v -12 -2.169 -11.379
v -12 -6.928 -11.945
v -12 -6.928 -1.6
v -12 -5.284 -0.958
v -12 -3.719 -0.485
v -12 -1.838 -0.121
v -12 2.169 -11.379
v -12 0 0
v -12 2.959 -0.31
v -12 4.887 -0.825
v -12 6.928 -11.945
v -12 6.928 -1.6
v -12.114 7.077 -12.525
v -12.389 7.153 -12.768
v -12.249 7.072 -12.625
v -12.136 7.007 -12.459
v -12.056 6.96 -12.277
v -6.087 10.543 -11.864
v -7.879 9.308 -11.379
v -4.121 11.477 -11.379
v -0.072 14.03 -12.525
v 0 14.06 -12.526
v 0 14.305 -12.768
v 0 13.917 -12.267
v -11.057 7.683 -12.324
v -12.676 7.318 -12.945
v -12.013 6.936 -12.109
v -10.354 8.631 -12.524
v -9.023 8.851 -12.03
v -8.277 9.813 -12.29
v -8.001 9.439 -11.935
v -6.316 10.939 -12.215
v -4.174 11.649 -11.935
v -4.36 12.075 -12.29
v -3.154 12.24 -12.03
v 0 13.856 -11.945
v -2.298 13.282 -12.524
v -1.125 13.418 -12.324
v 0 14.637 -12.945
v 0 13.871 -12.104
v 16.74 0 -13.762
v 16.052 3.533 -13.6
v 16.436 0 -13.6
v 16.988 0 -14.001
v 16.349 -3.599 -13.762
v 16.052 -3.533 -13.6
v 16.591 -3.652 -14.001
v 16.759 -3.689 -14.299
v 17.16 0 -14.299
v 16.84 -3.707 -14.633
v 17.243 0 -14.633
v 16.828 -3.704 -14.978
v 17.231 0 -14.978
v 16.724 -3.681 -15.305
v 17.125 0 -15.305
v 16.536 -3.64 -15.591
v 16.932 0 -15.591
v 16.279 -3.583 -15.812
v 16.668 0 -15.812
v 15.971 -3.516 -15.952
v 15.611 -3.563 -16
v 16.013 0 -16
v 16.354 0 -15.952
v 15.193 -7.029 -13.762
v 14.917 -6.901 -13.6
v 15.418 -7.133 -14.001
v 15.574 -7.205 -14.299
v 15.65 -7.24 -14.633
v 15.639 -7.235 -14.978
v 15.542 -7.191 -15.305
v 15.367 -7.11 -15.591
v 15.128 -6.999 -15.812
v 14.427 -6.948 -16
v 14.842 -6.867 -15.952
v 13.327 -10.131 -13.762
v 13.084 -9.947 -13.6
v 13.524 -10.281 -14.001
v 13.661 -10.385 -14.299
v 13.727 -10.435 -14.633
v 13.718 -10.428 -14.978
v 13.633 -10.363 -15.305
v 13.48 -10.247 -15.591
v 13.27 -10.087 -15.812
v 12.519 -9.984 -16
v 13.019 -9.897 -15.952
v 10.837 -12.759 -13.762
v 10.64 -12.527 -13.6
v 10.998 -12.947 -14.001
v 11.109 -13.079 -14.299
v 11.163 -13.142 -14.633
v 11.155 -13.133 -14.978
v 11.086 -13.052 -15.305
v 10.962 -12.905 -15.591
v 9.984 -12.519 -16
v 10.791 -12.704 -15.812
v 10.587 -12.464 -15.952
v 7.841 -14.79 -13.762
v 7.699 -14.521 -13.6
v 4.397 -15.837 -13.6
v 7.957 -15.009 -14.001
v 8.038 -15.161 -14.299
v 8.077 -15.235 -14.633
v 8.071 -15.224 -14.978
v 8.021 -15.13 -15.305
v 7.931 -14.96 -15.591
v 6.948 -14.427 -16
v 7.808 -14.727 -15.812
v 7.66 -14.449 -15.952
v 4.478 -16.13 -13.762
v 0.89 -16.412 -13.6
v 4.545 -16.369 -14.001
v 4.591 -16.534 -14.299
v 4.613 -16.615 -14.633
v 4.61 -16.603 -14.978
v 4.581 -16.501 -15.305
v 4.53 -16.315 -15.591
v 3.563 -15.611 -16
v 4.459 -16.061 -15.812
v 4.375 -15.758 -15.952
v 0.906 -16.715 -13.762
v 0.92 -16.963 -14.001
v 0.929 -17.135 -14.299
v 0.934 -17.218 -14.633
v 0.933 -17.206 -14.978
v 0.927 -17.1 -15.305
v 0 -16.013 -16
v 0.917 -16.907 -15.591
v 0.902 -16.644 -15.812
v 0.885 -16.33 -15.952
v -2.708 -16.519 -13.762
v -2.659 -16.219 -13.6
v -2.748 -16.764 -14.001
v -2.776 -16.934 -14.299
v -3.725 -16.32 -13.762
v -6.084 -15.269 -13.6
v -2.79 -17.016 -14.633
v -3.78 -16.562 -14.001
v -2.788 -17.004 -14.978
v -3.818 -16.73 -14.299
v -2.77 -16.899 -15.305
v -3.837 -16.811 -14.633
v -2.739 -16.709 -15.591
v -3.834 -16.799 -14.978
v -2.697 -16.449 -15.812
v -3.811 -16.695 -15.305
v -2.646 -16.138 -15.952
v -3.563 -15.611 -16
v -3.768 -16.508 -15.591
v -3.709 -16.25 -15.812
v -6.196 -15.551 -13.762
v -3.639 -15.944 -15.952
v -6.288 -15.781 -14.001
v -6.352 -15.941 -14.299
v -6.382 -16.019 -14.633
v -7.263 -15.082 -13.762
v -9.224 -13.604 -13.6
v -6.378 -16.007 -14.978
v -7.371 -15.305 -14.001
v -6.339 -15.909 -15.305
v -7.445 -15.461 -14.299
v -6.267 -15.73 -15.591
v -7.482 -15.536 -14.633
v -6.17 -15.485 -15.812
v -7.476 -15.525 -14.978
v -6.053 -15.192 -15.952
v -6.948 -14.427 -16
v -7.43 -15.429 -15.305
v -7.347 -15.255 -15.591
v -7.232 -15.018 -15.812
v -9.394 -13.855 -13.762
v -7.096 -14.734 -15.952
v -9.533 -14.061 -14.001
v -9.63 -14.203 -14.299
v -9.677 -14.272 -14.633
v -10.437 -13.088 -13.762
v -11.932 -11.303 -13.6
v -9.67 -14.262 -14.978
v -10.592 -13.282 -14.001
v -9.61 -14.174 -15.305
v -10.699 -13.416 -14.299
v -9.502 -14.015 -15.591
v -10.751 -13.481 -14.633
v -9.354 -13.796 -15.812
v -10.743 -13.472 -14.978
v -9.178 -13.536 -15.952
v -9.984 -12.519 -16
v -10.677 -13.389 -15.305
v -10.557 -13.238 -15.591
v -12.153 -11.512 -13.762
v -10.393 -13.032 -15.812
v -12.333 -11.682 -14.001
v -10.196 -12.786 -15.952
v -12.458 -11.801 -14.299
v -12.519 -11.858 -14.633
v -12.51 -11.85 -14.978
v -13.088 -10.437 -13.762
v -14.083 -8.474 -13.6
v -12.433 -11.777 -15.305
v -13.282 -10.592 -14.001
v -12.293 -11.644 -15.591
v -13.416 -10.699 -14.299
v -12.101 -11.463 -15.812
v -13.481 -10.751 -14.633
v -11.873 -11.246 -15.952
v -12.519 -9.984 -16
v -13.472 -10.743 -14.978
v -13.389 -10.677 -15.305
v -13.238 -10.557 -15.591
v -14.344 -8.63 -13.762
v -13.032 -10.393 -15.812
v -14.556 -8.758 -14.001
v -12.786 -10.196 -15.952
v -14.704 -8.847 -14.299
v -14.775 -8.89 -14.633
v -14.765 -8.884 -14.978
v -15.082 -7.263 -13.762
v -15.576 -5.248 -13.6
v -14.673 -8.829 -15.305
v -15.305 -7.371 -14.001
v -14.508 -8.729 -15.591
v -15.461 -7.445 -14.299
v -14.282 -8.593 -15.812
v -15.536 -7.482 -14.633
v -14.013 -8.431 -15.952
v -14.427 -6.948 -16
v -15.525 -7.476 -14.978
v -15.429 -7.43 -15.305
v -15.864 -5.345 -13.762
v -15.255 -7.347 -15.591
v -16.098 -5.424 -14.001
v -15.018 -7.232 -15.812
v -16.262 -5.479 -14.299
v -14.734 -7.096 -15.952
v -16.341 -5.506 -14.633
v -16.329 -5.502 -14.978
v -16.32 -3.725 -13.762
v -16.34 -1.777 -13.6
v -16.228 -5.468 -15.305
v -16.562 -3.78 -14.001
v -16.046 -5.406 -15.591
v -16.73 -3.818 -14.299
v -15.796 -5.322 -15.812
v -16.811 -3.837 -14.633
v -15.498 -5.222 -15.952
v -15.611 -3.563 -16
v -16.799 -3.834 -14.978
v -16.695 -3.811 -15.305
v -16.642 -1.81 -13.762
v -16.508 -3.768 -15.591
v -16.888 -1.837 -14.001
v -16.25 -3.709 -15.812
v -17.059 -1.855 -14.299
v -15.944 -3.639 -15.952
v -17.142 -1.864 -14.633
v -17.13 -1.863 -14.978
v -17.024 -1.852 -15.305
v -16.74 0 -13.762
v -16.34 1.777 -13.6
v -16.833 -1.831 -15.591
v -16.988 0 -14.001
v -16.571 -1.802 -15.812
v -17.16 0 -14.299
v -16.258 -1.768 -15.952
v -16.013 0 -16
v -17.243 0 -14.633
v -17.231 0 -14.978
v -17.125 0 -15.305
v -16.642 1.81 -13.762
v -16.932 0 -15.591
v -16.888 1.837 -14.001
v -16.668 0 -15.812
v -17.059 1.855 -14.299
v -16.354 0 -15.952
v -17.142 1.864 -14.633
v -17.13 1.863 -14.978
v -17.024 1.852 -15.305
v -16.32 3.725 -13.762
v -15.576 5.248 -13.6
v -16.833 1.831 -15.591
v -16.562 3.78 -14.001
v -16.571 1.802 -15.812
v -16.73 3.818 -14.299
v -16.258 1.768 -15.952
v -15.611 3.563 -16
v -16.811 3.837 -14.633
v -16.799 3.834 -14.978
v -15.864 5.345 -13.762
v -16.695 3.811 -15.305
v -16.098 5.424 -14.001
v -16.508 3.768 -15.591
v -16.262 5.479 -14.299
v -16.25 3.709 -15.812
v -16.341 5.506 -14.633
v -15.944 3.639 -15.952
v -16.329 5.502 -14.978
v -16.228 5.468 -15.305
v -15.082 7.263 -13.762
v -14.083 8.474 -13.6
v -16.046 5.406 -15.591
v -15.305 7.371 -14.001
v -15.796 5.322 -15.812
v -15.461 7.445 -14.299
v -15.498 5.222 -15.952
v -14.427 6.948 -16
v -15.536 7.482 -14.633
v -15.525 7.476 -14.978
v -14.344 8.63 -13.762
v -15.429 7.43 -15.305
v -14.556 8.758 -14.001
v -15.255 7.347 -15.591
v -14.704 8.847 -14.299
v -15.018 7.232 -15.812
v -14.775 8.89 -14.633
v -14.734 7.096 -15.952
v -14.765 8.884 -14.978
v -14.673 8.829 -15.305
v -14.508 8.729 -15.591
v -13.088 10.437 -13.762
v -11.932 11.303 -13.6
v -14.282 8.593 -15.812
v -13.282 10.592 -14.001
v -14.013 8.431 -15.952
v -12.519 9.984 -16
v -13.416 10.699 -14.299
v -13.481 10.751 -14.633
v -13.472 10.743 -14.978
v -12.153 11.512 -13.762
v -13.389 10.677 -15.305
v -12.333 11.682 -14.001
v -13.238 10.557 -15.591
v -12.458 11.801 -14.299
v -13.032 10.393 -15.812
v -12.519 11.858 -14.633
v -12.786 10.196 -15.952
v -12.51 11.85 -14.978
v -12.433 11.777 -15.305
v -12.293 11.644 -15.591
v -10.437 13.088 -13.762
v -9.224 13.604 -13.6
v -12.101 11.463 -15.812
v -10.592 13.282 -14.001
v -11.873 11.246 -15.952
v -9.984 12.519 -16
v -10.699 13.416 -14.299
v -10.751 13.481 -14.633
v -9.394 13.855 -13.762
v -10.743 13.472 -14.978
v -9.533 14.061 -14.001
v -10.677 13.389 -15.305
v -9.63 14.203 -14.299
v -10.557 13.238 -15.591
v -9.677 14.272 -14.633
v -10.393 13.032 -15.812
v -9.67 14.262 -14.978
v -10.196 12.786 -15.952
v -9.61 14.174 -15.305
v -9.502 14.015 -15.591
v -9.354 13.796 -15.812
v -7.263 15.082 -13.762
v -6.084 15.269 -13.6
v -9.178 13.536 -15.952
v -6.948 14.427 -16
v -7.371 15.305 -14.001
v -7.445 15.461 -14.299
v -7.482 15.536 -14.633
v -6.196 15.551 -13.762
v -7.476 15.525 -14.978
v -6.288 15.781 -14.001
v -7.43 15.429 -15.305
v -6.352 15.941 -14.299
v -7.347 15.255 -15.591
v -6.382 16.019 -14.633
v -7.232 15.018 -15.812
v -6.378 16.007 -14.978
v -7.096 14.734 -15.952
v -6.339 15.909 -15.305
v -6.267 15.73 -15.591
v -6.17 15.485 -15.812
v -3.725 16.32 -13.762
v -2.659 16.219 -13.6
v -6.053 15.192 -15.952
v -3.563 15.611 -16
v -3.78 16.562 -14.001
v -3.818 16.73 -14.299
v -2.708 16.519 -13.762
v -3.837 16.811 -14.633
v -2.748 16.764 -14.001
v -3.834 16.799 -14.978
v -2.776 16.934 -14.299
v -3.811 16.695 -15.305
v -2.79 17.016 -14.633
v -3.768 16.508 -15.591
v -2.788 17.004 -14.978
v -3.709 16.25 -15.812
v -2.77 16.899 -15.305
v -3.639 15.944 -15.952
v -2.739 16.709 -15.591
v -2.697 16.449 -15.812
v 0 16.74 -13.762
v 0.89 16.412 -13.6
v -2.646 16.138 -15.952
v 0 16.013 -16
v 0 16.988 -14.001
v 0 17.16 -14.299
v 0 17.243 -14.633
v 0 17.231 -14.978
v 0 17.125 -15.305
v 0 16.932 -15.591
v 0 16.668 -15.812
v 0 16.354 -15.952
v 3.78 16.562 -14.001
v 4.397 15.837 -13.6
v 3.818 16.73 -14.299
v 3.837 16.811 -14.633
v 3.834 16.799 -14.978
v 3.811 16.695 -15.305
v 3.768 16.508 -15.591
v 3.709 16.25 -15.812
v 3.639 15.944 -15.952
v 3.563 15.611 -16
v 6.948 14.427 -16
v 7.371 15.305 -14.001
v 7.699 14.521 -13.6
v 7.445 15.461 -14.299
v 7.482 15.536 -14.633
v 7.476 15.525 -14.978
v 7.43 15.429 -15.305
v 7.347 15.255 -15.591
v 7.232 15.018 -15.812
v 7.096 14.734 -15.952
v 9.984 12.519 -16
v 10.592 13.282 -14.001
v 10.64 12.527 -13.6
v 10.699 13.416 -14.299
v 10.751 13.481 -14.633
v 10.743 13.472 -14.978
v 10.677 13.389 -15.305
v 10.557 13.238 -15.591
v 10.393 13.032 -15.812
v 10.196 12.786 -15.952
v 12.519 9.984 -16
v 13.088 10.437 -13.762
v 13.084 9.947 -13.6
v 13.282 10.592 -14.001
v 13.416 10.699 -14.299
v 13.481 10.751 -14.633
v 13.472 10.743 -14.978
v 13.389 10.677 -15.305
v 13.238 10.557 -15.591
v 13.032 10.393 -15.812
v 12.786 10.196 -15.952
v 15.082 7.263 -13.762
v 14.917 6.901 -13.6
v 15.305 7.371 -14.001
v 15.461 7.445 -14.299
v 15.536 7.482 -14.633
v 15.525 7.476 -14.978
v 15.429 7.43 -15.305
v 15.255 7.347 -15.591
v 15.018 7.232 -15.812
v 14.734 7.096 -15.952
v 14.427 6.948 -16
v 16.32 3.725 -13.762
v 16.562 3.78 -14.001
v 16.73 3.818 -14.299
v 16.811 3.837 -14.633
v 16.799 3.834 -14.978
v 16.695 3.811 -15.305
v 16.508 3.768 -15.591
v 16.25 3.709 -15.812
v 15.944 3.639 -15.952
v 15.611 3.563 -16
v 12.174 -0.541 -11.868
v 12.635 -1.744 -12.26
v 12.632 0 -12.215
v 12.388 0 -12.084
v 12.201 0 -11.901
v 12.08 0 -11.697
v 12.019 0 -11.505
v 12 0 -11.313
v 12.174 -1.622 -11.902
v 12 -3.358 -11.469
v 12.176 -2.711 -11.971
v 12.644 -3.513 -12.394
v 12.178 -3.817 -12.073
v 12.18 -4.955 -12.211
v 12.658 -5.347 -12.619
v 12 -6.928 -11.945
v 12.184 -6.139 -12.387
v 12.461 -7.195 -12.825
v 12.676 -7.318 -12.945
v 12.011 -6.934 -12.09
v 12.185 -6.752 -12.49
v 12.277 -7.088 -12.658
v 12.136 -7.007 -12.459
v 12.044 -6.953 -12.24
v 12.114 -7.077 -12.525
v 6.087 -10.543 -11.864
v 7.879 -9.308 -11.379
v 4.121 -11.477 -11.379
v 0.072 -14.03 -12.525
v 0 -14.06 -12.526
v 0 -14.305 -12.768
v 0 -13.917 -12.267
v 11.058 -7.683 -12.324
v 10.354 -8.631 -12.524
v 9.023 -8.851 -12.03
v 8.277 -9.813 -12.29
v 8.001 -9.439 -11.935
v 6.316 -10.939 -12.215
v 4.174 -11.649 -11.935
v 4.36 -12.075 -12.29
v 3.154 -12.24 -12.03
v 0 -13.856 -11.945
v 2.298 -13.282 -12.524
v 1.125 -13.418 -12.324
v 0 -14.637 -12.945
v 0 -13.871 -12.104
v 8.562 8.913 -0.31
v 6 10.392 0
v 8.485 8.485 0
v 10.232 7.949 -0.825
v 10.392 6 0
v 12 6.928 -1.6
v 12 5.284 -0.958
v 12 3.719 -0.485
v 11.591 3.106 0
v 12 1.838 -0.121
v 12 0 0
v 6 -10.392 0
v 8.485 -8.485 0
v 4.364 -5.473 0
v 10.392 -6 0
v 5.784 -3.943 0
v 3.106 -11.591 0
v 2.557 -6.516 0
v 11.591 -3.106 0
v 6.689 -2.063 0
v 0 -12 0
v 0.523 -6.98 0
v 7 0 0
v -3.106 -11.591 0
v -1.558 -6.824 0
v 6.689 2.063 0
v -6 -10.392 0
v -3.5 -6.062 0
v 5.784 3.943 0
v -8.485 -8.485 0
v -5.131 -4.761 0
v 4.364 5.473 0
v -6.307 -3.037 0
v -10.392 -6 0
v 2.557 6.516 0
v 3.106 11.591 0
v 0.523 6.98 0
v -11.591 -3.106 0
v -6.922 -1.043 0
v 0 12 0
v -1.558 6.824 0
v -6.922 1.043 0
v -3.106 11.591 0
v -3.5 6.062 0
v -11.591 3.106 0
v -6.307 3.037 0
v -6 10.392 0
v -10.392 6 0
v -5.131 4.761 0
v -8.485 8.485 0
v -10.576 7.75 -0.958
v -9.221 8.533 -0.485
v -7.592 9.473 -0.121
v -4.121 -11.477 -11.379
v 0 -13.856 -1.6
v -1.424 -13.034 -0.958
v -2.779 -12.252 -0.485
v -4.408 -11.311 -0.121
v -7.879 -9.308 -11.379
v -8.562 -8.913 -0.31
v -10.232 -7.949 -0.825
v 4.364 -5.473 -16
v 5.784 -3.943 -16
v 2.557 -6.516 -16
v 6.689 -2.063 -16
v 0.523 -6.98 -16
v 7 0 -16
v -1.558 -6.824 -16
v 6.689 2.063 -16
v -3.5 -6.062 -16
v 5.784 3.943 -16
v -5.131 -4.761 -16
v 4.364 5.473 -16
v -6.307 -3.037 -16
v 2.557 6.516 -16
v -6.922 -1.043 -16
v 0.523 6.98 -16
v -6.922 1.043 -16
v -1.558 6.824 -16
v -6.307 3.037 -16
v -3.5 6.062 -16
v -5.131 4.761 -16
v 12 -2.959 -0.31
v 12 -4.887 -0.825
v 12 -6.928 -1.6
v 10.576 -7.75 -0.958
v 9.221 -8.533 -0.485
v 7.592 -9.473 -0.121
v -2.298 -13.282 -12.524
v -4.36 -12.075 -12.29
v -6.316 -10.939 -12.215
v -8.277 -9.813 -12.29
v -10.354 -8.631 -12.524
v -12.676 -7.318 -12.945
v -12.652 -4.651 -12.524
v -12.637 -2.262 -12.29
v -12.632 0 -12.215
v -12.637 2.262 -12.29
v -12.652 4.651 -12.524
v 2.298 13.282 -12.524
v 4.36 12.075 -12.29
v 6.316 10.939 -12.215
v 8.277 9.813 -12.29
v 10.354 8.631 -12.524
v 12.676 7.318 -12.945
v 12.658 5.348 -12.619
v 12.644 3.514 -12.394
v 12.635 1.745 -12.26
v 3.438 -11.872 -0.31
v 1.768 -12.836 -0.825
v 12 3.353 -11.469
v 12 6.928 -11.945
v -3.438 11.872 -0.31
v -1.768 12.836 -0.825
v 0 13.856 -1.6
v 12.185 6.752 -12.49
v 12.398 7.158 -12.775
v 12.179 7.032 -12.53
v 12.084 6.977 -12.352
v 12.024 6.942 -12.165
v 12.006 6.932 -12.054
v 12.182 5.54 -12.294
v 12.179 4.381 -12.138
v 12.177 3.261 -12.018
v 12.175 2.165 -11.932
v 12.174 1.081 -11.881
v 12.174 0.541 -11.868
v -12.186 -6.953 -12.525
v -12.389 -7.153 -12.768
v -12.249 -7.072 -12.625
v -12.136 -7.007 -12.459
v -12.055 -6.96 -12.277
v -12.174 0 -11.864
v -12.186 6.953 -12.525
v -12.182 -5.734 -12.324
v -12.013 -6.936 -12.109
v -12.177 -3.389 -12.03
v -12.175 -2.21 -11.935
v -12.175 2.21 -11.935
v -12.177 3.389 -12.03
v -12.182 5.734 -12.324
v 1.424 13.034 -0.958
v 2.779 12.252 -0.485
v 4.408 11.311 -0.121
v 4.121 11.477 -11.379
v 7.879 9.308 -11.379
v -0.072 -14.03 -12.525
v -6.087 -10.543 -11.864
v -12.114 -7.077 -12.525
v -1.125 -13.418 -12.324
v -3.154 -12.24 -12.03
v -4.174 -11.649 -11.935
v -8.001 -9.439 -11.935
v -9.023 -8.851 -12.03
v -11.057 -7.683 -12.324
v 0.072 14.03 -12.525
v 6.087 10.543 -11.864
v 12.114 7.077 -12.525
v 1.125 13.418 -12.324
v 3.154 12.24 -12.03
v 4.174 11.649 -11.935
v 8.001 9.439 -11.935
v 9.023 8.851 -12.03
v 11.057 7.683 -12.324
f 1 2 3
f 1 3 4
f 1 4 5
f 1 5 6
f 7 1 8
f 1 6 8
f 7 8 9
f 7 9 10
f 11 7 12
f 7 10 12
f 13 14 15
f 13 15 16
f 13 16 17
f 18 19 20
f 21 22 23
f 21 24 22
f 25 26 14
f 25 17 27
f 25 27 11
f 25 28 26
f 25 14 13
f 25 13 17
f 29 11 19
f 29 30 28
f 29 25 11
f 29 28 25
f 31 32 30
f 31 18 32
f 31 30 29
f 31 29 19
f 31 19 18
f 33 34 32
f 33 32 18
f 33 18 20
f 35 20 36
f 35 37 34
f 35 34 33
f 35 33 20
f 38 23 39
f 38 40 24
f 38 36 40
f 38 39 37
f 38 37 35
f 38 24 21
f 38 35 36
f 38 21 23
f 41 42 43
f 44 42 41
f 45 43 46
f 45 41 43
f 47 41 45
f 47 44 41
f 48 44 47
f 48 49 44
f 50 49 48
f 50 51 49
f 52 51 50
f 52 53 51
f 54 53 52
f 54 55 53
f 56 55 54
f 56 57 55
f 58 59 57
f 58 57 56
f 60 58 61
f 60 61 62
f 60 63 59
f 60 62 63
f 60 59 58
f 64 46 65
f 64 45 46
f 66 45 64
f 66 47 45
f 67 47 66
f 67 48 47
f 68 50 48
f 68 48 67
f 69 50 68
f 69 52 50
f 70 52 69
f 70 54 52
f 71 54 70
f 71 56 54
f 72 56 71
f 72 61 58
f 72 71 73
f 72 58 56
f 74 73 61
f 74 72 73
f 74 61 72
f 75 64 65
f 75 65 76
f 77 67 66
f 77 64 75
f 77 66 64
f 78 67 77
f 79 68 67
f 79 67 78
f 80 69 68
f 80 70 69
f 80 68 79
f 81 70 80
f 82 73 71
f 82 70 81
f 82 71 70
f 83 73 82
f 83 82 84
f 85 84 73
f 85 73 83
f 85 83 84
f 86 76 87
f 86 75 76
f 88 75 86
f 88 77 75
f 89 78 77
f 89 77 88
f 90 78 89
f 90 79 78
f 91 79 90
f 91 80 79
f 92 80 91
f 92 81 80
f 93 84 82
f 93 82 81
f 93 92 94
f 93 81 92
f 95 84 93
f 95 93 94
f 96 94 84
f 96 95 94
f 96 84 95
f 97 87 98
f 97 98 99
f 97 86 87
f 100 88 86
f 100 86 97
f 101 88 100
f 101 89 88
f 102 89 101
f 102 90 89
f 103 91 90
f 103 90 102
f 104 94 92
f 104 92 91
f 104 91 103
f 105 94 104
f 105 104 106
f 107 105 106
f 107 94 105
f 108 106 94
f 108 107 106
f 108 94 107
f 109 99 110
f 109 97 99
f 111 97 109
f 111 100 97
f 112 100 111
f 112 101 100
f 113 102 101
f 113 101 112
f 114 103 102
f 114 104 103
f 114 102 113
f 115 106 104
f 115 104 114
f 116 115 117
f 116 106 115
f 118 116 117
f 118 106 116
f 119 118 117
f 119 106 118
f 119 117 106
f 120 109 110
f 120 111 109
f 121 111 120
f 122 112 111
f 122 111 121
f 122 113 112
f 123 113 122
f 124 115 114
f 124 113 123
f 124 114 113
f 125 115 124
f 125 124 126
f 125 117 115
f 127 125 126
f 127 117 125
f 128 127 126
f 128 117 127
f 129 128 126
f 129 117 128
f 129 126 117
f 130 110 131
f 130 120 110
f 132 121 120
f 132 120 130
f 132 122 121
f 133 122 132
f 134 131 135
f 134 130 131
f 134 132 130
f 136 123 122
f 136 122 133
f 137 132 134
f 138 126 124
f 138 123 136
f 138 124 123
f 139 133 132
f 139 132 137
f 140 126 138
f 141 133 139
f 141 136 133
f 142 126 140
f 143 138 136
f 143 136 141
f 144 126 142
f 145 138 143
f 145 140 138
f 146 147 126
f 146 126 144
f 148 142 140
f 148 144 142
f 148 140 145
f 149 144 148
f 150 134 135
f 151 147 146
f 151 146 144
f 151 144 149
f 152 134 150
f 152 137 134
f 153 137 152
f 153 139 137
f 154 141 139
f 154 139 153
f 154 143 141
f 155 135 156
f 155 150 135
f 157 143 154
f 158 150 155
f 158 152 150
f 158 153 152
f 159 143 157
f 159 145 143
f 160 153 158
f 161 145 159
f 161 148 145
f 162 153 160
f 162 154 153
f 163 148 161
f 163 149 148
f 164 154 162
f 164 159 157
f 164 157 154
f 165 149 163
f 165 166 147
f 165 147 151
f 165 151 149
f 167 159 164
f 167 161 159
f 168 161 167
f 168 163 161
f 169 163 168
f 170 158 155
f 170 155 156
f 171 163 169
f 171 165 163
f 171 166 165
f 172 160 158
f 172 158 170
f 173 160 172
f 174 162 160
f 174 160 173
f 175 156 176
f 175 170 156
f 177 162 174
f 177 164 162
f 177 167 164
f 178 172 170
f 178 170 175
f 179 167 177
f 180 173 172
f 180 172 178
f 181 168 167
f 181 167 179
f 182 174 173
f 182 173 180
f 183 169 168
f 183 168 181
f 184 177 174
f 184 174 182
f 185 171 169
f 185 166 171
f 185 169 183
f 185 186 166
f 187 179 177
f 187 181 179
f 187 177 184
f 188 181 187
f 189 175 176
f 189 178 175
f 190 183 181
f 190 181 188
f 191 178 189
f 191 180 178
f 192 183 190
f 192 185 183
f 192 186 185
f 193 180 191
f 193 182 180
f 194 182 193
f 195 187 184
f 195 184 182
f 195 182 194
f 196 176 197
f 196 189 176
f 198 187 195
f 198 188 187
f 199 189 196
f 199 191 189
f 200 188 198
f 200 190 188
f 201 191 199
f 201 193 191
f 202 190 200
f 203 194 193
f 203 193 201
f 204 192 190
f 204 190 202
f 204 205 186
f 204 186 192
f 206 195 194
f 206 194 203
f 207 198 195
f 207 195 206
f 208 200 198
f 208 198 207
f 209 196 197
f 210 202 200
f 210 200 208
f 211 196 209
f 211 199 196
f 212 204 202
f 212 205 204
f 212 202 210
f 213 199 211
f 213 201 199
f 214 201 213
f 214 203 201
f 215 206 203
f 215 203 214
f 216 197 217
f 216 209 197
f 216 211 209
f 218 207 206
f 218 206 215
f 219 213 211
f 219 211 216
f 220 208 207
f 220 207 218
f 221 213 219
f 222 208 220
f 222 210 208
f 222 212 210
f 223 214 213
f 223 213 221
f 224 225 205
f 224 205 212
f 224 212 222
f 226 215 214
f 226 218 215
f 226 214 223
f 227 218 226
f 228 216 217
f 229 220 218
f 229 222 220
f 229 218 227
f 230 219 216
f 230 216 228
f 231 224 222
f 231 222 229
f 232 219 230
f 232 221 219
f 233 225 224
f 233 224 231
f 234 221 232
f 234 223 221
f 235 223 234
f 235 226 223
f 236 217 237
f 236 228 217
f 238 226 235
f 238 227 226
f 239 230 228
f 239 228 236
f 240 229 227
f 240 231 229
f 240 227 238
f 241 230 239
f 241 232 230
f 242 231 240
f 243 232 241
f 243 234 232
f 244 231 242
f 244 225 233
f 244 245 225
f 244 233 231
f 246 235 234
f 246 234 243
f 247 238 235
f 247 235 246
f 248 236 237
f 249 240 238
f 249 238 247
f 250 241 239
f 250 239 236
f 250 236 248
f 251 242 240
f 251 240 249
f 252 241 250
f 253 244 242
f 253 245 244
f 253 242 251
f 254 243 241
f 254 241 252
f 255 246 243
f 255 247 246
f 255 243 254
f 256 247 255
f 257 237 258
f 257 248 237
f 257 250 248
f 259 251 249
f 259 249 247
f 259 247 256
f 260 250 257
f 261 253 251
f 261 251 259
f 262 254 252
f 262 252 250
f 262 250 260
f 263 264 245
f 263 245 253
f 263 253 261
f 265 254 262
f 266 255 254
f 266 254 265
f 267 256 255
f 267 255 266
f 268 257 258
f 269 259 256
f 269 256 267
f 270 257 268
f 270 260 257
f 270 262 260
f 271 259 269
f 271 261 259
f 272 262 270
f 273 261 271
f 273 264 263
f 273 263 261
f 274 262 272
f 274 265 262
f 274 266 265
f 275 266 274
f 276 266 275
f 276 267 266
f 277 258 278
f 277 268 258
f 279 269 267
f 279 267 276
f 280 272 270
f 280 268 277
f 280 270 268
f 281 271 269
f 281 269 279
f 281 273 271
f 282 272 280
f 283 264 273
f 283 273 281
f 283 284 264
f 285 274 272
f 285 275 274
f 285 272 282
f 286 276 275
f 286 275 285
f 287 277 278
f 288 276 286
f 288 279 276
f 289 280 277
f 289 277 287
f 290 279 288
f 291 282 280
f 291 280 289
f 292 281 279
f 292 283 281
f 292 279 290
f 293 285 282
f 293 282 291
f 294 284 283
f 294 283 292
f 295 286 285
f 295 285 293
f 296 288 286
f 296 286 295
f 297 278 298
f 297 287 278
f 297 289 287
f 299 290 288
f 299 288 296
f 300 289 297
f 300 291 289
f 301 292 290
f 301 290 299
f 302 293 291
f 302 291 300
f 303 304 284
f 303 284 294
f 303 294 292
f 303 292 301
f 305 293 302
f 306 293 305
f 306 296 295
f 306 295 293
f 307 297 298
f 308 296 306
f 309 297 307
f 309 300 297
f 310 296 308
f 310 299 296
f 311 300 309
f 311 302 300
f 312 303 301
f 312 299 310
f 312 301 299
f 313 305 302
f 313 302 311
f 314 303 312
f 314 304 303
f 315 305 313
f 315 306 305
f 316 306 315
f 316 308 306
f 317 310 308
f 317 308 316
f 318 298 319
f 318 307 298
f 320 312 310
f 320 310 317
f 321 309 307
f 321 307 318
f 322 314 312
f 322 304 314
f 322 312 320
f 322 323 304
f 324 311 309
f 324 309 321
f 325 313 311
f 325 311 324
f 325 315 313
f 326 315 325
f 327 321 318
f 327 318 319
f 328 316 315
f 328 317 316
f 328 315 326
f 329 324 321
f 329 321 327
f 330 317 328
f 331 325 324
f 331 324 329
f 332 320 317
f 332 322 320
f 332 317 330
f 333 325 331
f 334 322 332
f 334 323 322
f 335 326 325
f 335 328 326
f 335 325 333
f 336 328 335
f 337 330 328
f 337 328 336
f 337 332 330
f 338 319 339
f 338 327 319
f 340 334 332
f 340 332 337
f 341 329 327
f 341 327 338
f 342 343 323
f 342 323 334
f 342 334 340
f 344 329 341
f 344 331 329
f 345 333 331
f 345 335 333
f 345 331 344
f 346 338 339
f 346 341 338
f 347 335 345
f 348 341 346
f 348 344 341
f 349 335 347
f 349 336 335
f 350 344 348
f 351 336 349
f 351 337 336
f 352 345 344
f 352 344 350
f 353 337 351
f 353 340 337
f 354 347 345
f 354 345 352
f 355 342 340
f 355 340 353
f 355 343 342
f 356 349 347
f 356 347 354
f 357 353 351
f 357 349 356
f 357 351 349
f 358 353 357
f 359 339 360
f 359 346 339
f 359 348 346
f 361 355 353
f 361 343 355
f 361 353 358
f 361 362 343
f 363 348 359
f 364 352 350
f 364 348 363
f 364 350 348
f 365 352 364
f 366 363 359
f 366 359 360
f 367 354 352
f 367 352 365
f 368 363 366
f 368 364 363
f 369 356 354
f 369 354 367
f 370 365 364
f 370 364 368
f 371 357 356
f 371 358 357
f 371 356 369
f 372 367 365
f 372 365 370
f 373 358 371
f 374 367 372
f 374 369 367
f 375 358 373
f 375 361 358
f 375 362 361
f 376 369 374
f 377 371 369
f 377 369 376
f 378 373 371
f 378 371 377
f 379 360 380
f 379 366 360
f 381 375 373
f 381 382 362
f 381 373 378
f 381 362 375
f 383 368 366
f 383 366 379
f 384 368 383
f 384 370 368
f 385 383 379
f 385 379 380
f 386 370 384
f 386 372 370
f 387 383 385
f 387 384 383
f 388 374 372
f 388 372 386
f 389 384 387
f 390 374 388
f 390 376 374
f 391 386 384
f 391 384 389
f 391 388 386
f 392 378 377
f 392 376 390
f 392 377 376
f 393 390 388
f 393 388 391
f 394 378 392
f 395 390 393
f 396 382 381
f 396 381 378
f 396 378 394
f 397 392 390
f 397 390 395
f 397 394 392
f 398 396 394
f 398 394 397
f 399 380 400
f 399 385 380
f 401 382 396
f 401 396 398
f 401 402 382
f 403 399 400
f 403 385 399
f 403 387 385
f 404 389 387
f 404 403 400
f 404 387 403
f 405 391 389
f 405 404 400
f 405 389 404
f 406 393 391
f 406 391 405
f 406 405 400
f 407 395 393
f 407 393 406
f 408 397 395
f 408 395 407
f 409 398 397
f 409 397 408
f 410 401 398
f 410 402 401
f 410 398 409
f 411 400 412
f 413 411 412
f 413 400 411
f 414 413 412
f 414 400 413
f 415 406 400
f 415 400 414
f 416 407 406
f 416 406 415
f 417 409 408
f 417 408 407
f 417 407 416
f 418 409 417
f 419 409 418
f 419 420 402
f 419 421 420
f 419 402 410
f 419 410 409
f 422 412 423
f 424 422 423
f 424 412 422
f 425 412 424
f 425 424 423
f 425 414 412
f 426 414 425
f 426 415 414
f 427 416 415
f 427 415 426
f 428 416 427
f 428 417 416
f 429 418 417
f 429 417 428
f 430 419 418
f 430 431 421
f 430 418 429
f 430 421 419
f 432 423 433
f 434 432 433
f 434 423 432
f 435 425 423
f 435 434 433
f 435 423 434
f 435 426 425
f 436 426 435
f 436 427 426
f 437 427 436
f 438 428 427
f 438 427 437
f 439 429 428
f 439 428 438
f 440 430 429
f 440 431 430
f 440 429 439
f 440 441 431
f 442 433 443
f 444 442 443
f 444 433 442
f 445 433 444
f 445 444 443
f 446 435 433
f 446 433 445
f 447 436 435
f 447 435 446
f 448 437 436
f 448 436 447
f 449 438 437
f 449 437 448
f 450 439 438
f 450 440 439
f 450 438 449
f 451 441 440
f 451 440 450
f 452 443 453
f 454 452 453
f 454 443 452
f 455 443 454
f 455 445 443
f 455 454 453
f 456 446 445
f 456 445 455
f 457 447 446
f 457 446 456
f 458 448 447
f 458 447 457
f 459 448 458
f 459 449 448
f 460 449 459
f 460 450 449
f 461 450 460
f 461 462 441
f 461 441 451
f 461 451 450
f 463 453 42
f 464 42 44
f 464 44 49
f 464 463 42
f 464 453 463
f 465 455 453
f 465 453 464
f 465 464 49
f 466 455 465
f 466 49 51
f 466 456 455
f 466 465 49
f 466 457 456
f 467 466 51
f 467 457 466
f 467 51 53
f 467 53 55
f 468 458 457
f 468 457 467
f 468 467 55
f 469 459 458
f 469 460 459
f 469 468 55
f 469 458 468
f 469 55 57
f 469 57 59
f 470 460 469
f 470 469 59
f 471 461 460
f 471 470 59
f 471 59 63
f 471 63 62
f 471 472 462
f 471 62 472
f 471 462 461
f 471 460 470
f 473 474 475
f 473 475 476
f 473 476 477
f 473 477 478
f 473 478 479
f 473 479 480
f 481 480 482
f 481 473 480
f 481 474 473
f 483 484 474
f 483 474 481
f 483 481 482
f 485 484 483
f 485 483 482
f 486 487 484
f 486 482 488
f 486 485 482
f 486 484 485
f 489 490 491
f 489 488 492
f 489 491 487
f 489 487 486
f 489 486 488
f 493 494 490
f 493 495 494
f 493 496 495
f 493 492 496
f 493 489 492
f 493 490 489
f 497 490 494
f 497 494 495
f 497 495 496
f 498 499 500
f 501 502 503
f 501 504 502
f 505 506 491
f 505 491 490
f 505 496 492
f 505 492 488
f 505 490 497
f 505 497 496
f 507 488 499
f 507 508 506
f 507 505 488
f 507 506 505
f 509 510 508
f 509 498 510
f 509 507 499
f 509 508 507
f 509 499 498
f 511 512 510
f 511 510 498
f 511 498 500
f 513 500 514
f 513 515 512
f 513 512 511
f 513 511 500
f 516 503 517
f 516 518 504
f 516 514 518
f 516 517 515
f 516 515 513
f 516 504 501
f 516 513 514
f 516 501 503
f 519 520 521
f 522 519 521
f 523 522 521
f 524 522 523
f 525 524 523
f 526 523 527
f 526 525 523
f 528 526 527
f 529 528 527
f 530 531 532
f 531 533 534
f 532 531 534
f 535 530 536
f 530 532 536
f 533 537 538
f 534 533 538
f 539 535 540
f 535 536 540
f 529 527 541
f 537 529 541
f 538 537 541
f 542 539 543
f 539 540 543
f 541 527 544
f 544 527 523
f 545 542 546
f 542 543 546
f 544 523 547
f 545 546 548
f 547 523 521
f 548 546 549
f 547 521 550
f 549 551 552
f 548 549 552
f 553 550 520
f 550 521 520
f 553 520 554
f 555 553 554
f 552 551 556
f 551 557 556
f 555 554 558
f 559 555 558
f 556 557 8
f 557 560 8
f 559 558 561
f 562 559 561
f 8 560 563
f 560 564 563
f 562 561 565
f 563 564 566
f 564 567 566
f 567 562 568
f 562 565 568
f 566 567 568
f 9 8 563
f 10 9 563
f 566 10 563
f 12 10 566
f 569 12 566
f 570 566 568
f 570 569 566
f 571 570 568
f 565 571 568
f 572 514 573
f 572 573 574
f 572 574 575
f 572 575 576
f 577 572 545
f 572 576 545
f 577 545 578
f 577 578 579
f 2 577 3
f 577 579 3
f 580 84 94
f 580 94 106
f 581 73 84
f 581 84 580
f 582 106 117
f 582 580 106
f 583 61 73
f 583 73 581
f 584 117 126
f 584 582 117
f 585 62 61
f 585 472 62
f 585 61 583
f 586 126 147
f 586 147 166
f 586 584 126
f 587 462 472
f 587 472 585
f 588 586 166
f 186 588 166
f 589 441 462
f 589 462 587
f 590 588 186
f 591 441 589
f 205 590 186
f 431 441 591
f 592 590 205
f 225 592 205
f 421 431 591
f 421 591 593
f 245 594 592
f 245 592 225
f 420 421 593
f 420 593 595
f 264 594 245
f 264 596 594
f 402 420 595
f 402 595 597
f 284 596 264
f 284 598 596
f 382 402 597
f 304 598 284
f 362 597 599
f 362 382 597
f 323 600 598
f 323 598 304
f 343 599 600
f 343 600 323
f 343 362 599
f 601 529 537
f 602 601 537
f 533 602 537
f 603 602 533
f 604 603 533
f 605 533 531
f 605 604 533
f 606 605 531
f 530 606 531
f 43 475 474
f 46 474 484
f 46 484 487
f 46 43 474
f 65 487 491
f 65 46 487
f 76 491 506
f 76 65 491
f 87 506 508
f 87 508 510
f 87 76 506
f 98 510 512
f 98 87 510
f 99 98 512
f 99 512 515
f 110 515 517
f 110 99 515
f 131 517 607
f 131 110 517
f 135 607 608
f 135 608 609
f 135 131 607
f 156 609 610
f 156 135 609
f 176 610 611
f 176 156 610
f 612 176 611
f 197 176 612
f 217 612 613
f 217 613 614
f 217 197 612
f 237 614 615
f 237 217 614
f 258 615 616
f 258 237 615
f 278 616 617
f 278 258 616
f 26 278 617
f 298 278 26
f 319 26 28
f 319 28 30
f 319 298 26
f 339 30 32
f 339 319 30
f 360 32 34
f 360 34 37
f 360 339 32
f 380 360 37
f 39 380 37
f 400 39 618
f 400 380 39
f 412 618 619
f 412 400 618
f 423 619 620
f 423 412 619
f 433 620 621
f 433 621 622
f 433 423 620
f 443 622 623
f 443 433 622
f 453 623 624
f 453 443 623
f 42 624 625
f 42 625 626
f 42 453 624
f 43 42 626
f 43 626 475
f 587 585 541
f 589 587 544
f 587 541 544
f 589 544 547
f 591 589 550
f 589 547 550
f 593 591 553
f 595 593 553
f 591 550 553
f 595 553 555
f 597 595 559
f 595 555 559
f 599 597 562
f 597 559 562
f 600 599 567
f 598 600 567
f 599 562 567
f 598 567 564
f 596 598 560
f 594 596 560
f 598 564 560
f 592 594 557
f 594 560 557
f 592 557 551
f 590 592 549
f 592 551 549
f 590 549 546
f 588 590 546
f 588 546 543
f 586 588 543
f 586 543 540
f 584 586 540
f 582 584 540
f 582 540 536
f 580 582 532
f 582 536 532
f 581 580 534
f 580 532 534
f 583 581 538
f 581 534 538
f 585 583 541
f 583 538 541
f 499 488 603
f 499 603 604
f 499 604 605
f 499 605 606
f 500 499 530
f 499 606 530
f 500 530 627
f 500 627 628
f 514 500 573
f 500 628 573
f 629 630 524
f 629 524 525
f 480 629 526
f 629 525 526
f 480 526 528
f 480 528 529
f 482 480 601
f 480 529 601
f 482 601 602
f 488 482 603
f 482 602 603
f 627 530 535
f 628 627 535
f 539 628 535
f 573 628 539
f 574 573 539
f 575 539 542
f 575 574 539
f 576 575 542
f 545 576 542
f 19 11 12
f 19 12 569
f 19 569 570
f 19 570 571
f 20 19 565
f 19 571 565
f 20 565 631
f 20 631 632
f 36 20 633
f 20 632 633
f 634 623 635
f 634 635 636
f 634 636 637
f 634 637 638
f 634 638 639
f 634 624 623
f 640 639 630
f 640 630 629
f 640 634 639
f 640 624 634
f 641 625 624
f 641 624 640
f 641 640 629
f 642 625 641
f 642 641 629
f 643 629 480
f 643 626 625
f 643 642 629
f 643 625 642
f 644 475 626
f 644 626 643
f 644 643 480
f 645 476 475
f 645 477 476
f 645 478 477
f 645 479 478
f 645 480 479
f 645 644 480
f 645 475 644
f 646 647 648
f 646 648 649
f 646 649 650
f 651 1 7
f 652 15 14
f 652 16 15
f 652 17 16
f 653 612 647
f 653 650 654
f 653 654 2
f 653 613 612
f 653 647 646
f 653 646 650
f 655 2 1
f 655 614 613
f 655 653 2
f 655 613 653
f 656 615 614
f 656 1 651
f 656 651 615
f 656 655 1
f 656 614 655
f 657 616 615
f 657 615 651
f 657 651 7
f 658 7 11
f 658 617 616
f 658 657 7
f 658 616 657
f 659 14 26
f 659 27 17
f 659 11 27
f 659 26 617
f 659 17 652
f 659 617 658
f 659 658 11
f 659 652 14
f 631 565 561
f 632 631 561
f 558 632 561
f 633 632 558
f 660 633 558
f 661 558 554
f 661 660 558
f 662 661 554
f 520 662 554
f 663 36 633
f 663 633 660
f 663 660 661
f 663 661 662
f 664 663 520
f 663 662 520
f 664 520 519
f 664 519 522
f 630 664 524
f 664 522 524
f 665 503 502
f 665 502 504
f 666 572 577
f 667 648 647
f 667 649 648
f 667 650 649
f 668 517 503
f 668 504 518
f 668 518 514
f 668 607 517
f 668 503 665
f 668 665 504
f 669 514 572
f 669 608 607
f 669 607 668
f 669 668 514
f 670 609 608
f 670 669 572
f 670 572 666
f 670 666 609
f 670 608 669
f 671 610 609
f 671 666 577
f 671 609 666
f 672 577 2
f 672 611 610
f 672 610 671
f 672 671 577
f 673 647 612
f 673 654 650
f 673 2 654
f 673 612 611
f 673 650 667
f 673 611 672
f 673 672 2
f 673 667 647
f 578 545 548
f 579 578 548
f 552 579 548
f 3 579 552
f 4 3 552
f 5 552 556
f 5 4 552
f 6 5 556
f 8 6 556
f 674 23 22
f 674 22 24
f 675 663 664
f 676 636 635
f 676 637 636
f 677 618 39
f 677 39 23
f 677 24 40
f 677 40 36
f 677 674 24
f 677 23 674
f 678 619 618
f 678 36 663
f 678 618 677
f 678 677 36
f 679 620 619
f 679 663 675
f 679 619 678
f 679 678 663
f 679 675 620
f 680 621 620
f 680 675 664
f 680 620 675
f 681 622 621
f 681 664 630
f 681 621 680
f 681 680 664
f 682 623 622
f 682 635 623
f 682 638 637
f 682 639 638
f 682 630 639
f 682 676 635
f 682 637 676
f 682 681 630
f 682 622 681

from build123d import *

# Parameters (mm, degrees)
BASENUTSKE_R   = 7
BASENUT_DEPTH  = 16
FLANGEFILLET_R = 0.96


with BuildPart() as part:
    # BaseNutSke → BaseNut (new body)
    with BuildSketch(Plane.XY):
        Polygon((12, 6.92820323), (12, -6.92820323), (0, -13.856406461), (-12, -6.92820323), (-12, 6.92820323), (0, 13.856406461), align=None)
        Circle(BASENUTSKE_R, mode=Mode.SUBTRACT)
    extrude(amount=-BASENUT_DEPTH)

    # Sketch6 → Flange (revolve)
    with BuildSketch(Plane(origin=(0, 0, 0), x_dir=(0, 0, -1), z_dir=(1, 0, 0)), mode=Mode.PRIVATE) as flange_sk:
        with BuildLine():
            Line((10.165622253, 7), (13.6, 16.435875309))
            ThreePointArc((13.6, 16.435875309), (14.977547085, 17.231202489), (16, 16.012690555))
            Line((16, 16.012690555), (16, 7))
            Line((16, 7), (10.165622253, 7))
        make_face()
    revolve(flange_sk.sketch.rotate(Axis((0, 0, 0), (0, 0, -1)), 90), axis=Axis((0, 0, 0), (0, 0, -1)))

    # Sketch3 → Double-Chamfer (revolve, cut)
    with BuildSketch(Plane(origin=(0, 0, 0), x_dir=(0, 0, -1), z_dir=(1, 0, 0)), mode=Mode.PRIVATE) as double_chamfer_sk:
        Polygon((1.6, 26.556406461), (-12.7, 26.556406461), (-12.7, 12), (0, 12), (1.6, 13.856406461), align=None)
    revolve(double_chamfer_sk.sketch.rotate(Axis((0, 0, 0), (0, 0, -1)), 90), axis=Axis((0, 0, 0), (0, 0, -1)), mode=Mode.SUBTRACT)

    # FlangeFillet
    flangefillet_edges = [part.edges().sort_by_distance(p)[0] for p in [
        (12, -3.479213152, -12.16534592),
        (12, 3.479213152, -12.16534592),
        (6, -10.392304845, -11.985473425),
        (6, 10.392304845, -11.985473425),
        (-6, 10.392304845, -11.985473425),
        (-12, 0, -11.985473425),
        (-6, -10.392304845, -11.985473425),
    ]]
    fillet(flangefillet_edges, radius=FLANGEFILLET_R)


solid = part.part
